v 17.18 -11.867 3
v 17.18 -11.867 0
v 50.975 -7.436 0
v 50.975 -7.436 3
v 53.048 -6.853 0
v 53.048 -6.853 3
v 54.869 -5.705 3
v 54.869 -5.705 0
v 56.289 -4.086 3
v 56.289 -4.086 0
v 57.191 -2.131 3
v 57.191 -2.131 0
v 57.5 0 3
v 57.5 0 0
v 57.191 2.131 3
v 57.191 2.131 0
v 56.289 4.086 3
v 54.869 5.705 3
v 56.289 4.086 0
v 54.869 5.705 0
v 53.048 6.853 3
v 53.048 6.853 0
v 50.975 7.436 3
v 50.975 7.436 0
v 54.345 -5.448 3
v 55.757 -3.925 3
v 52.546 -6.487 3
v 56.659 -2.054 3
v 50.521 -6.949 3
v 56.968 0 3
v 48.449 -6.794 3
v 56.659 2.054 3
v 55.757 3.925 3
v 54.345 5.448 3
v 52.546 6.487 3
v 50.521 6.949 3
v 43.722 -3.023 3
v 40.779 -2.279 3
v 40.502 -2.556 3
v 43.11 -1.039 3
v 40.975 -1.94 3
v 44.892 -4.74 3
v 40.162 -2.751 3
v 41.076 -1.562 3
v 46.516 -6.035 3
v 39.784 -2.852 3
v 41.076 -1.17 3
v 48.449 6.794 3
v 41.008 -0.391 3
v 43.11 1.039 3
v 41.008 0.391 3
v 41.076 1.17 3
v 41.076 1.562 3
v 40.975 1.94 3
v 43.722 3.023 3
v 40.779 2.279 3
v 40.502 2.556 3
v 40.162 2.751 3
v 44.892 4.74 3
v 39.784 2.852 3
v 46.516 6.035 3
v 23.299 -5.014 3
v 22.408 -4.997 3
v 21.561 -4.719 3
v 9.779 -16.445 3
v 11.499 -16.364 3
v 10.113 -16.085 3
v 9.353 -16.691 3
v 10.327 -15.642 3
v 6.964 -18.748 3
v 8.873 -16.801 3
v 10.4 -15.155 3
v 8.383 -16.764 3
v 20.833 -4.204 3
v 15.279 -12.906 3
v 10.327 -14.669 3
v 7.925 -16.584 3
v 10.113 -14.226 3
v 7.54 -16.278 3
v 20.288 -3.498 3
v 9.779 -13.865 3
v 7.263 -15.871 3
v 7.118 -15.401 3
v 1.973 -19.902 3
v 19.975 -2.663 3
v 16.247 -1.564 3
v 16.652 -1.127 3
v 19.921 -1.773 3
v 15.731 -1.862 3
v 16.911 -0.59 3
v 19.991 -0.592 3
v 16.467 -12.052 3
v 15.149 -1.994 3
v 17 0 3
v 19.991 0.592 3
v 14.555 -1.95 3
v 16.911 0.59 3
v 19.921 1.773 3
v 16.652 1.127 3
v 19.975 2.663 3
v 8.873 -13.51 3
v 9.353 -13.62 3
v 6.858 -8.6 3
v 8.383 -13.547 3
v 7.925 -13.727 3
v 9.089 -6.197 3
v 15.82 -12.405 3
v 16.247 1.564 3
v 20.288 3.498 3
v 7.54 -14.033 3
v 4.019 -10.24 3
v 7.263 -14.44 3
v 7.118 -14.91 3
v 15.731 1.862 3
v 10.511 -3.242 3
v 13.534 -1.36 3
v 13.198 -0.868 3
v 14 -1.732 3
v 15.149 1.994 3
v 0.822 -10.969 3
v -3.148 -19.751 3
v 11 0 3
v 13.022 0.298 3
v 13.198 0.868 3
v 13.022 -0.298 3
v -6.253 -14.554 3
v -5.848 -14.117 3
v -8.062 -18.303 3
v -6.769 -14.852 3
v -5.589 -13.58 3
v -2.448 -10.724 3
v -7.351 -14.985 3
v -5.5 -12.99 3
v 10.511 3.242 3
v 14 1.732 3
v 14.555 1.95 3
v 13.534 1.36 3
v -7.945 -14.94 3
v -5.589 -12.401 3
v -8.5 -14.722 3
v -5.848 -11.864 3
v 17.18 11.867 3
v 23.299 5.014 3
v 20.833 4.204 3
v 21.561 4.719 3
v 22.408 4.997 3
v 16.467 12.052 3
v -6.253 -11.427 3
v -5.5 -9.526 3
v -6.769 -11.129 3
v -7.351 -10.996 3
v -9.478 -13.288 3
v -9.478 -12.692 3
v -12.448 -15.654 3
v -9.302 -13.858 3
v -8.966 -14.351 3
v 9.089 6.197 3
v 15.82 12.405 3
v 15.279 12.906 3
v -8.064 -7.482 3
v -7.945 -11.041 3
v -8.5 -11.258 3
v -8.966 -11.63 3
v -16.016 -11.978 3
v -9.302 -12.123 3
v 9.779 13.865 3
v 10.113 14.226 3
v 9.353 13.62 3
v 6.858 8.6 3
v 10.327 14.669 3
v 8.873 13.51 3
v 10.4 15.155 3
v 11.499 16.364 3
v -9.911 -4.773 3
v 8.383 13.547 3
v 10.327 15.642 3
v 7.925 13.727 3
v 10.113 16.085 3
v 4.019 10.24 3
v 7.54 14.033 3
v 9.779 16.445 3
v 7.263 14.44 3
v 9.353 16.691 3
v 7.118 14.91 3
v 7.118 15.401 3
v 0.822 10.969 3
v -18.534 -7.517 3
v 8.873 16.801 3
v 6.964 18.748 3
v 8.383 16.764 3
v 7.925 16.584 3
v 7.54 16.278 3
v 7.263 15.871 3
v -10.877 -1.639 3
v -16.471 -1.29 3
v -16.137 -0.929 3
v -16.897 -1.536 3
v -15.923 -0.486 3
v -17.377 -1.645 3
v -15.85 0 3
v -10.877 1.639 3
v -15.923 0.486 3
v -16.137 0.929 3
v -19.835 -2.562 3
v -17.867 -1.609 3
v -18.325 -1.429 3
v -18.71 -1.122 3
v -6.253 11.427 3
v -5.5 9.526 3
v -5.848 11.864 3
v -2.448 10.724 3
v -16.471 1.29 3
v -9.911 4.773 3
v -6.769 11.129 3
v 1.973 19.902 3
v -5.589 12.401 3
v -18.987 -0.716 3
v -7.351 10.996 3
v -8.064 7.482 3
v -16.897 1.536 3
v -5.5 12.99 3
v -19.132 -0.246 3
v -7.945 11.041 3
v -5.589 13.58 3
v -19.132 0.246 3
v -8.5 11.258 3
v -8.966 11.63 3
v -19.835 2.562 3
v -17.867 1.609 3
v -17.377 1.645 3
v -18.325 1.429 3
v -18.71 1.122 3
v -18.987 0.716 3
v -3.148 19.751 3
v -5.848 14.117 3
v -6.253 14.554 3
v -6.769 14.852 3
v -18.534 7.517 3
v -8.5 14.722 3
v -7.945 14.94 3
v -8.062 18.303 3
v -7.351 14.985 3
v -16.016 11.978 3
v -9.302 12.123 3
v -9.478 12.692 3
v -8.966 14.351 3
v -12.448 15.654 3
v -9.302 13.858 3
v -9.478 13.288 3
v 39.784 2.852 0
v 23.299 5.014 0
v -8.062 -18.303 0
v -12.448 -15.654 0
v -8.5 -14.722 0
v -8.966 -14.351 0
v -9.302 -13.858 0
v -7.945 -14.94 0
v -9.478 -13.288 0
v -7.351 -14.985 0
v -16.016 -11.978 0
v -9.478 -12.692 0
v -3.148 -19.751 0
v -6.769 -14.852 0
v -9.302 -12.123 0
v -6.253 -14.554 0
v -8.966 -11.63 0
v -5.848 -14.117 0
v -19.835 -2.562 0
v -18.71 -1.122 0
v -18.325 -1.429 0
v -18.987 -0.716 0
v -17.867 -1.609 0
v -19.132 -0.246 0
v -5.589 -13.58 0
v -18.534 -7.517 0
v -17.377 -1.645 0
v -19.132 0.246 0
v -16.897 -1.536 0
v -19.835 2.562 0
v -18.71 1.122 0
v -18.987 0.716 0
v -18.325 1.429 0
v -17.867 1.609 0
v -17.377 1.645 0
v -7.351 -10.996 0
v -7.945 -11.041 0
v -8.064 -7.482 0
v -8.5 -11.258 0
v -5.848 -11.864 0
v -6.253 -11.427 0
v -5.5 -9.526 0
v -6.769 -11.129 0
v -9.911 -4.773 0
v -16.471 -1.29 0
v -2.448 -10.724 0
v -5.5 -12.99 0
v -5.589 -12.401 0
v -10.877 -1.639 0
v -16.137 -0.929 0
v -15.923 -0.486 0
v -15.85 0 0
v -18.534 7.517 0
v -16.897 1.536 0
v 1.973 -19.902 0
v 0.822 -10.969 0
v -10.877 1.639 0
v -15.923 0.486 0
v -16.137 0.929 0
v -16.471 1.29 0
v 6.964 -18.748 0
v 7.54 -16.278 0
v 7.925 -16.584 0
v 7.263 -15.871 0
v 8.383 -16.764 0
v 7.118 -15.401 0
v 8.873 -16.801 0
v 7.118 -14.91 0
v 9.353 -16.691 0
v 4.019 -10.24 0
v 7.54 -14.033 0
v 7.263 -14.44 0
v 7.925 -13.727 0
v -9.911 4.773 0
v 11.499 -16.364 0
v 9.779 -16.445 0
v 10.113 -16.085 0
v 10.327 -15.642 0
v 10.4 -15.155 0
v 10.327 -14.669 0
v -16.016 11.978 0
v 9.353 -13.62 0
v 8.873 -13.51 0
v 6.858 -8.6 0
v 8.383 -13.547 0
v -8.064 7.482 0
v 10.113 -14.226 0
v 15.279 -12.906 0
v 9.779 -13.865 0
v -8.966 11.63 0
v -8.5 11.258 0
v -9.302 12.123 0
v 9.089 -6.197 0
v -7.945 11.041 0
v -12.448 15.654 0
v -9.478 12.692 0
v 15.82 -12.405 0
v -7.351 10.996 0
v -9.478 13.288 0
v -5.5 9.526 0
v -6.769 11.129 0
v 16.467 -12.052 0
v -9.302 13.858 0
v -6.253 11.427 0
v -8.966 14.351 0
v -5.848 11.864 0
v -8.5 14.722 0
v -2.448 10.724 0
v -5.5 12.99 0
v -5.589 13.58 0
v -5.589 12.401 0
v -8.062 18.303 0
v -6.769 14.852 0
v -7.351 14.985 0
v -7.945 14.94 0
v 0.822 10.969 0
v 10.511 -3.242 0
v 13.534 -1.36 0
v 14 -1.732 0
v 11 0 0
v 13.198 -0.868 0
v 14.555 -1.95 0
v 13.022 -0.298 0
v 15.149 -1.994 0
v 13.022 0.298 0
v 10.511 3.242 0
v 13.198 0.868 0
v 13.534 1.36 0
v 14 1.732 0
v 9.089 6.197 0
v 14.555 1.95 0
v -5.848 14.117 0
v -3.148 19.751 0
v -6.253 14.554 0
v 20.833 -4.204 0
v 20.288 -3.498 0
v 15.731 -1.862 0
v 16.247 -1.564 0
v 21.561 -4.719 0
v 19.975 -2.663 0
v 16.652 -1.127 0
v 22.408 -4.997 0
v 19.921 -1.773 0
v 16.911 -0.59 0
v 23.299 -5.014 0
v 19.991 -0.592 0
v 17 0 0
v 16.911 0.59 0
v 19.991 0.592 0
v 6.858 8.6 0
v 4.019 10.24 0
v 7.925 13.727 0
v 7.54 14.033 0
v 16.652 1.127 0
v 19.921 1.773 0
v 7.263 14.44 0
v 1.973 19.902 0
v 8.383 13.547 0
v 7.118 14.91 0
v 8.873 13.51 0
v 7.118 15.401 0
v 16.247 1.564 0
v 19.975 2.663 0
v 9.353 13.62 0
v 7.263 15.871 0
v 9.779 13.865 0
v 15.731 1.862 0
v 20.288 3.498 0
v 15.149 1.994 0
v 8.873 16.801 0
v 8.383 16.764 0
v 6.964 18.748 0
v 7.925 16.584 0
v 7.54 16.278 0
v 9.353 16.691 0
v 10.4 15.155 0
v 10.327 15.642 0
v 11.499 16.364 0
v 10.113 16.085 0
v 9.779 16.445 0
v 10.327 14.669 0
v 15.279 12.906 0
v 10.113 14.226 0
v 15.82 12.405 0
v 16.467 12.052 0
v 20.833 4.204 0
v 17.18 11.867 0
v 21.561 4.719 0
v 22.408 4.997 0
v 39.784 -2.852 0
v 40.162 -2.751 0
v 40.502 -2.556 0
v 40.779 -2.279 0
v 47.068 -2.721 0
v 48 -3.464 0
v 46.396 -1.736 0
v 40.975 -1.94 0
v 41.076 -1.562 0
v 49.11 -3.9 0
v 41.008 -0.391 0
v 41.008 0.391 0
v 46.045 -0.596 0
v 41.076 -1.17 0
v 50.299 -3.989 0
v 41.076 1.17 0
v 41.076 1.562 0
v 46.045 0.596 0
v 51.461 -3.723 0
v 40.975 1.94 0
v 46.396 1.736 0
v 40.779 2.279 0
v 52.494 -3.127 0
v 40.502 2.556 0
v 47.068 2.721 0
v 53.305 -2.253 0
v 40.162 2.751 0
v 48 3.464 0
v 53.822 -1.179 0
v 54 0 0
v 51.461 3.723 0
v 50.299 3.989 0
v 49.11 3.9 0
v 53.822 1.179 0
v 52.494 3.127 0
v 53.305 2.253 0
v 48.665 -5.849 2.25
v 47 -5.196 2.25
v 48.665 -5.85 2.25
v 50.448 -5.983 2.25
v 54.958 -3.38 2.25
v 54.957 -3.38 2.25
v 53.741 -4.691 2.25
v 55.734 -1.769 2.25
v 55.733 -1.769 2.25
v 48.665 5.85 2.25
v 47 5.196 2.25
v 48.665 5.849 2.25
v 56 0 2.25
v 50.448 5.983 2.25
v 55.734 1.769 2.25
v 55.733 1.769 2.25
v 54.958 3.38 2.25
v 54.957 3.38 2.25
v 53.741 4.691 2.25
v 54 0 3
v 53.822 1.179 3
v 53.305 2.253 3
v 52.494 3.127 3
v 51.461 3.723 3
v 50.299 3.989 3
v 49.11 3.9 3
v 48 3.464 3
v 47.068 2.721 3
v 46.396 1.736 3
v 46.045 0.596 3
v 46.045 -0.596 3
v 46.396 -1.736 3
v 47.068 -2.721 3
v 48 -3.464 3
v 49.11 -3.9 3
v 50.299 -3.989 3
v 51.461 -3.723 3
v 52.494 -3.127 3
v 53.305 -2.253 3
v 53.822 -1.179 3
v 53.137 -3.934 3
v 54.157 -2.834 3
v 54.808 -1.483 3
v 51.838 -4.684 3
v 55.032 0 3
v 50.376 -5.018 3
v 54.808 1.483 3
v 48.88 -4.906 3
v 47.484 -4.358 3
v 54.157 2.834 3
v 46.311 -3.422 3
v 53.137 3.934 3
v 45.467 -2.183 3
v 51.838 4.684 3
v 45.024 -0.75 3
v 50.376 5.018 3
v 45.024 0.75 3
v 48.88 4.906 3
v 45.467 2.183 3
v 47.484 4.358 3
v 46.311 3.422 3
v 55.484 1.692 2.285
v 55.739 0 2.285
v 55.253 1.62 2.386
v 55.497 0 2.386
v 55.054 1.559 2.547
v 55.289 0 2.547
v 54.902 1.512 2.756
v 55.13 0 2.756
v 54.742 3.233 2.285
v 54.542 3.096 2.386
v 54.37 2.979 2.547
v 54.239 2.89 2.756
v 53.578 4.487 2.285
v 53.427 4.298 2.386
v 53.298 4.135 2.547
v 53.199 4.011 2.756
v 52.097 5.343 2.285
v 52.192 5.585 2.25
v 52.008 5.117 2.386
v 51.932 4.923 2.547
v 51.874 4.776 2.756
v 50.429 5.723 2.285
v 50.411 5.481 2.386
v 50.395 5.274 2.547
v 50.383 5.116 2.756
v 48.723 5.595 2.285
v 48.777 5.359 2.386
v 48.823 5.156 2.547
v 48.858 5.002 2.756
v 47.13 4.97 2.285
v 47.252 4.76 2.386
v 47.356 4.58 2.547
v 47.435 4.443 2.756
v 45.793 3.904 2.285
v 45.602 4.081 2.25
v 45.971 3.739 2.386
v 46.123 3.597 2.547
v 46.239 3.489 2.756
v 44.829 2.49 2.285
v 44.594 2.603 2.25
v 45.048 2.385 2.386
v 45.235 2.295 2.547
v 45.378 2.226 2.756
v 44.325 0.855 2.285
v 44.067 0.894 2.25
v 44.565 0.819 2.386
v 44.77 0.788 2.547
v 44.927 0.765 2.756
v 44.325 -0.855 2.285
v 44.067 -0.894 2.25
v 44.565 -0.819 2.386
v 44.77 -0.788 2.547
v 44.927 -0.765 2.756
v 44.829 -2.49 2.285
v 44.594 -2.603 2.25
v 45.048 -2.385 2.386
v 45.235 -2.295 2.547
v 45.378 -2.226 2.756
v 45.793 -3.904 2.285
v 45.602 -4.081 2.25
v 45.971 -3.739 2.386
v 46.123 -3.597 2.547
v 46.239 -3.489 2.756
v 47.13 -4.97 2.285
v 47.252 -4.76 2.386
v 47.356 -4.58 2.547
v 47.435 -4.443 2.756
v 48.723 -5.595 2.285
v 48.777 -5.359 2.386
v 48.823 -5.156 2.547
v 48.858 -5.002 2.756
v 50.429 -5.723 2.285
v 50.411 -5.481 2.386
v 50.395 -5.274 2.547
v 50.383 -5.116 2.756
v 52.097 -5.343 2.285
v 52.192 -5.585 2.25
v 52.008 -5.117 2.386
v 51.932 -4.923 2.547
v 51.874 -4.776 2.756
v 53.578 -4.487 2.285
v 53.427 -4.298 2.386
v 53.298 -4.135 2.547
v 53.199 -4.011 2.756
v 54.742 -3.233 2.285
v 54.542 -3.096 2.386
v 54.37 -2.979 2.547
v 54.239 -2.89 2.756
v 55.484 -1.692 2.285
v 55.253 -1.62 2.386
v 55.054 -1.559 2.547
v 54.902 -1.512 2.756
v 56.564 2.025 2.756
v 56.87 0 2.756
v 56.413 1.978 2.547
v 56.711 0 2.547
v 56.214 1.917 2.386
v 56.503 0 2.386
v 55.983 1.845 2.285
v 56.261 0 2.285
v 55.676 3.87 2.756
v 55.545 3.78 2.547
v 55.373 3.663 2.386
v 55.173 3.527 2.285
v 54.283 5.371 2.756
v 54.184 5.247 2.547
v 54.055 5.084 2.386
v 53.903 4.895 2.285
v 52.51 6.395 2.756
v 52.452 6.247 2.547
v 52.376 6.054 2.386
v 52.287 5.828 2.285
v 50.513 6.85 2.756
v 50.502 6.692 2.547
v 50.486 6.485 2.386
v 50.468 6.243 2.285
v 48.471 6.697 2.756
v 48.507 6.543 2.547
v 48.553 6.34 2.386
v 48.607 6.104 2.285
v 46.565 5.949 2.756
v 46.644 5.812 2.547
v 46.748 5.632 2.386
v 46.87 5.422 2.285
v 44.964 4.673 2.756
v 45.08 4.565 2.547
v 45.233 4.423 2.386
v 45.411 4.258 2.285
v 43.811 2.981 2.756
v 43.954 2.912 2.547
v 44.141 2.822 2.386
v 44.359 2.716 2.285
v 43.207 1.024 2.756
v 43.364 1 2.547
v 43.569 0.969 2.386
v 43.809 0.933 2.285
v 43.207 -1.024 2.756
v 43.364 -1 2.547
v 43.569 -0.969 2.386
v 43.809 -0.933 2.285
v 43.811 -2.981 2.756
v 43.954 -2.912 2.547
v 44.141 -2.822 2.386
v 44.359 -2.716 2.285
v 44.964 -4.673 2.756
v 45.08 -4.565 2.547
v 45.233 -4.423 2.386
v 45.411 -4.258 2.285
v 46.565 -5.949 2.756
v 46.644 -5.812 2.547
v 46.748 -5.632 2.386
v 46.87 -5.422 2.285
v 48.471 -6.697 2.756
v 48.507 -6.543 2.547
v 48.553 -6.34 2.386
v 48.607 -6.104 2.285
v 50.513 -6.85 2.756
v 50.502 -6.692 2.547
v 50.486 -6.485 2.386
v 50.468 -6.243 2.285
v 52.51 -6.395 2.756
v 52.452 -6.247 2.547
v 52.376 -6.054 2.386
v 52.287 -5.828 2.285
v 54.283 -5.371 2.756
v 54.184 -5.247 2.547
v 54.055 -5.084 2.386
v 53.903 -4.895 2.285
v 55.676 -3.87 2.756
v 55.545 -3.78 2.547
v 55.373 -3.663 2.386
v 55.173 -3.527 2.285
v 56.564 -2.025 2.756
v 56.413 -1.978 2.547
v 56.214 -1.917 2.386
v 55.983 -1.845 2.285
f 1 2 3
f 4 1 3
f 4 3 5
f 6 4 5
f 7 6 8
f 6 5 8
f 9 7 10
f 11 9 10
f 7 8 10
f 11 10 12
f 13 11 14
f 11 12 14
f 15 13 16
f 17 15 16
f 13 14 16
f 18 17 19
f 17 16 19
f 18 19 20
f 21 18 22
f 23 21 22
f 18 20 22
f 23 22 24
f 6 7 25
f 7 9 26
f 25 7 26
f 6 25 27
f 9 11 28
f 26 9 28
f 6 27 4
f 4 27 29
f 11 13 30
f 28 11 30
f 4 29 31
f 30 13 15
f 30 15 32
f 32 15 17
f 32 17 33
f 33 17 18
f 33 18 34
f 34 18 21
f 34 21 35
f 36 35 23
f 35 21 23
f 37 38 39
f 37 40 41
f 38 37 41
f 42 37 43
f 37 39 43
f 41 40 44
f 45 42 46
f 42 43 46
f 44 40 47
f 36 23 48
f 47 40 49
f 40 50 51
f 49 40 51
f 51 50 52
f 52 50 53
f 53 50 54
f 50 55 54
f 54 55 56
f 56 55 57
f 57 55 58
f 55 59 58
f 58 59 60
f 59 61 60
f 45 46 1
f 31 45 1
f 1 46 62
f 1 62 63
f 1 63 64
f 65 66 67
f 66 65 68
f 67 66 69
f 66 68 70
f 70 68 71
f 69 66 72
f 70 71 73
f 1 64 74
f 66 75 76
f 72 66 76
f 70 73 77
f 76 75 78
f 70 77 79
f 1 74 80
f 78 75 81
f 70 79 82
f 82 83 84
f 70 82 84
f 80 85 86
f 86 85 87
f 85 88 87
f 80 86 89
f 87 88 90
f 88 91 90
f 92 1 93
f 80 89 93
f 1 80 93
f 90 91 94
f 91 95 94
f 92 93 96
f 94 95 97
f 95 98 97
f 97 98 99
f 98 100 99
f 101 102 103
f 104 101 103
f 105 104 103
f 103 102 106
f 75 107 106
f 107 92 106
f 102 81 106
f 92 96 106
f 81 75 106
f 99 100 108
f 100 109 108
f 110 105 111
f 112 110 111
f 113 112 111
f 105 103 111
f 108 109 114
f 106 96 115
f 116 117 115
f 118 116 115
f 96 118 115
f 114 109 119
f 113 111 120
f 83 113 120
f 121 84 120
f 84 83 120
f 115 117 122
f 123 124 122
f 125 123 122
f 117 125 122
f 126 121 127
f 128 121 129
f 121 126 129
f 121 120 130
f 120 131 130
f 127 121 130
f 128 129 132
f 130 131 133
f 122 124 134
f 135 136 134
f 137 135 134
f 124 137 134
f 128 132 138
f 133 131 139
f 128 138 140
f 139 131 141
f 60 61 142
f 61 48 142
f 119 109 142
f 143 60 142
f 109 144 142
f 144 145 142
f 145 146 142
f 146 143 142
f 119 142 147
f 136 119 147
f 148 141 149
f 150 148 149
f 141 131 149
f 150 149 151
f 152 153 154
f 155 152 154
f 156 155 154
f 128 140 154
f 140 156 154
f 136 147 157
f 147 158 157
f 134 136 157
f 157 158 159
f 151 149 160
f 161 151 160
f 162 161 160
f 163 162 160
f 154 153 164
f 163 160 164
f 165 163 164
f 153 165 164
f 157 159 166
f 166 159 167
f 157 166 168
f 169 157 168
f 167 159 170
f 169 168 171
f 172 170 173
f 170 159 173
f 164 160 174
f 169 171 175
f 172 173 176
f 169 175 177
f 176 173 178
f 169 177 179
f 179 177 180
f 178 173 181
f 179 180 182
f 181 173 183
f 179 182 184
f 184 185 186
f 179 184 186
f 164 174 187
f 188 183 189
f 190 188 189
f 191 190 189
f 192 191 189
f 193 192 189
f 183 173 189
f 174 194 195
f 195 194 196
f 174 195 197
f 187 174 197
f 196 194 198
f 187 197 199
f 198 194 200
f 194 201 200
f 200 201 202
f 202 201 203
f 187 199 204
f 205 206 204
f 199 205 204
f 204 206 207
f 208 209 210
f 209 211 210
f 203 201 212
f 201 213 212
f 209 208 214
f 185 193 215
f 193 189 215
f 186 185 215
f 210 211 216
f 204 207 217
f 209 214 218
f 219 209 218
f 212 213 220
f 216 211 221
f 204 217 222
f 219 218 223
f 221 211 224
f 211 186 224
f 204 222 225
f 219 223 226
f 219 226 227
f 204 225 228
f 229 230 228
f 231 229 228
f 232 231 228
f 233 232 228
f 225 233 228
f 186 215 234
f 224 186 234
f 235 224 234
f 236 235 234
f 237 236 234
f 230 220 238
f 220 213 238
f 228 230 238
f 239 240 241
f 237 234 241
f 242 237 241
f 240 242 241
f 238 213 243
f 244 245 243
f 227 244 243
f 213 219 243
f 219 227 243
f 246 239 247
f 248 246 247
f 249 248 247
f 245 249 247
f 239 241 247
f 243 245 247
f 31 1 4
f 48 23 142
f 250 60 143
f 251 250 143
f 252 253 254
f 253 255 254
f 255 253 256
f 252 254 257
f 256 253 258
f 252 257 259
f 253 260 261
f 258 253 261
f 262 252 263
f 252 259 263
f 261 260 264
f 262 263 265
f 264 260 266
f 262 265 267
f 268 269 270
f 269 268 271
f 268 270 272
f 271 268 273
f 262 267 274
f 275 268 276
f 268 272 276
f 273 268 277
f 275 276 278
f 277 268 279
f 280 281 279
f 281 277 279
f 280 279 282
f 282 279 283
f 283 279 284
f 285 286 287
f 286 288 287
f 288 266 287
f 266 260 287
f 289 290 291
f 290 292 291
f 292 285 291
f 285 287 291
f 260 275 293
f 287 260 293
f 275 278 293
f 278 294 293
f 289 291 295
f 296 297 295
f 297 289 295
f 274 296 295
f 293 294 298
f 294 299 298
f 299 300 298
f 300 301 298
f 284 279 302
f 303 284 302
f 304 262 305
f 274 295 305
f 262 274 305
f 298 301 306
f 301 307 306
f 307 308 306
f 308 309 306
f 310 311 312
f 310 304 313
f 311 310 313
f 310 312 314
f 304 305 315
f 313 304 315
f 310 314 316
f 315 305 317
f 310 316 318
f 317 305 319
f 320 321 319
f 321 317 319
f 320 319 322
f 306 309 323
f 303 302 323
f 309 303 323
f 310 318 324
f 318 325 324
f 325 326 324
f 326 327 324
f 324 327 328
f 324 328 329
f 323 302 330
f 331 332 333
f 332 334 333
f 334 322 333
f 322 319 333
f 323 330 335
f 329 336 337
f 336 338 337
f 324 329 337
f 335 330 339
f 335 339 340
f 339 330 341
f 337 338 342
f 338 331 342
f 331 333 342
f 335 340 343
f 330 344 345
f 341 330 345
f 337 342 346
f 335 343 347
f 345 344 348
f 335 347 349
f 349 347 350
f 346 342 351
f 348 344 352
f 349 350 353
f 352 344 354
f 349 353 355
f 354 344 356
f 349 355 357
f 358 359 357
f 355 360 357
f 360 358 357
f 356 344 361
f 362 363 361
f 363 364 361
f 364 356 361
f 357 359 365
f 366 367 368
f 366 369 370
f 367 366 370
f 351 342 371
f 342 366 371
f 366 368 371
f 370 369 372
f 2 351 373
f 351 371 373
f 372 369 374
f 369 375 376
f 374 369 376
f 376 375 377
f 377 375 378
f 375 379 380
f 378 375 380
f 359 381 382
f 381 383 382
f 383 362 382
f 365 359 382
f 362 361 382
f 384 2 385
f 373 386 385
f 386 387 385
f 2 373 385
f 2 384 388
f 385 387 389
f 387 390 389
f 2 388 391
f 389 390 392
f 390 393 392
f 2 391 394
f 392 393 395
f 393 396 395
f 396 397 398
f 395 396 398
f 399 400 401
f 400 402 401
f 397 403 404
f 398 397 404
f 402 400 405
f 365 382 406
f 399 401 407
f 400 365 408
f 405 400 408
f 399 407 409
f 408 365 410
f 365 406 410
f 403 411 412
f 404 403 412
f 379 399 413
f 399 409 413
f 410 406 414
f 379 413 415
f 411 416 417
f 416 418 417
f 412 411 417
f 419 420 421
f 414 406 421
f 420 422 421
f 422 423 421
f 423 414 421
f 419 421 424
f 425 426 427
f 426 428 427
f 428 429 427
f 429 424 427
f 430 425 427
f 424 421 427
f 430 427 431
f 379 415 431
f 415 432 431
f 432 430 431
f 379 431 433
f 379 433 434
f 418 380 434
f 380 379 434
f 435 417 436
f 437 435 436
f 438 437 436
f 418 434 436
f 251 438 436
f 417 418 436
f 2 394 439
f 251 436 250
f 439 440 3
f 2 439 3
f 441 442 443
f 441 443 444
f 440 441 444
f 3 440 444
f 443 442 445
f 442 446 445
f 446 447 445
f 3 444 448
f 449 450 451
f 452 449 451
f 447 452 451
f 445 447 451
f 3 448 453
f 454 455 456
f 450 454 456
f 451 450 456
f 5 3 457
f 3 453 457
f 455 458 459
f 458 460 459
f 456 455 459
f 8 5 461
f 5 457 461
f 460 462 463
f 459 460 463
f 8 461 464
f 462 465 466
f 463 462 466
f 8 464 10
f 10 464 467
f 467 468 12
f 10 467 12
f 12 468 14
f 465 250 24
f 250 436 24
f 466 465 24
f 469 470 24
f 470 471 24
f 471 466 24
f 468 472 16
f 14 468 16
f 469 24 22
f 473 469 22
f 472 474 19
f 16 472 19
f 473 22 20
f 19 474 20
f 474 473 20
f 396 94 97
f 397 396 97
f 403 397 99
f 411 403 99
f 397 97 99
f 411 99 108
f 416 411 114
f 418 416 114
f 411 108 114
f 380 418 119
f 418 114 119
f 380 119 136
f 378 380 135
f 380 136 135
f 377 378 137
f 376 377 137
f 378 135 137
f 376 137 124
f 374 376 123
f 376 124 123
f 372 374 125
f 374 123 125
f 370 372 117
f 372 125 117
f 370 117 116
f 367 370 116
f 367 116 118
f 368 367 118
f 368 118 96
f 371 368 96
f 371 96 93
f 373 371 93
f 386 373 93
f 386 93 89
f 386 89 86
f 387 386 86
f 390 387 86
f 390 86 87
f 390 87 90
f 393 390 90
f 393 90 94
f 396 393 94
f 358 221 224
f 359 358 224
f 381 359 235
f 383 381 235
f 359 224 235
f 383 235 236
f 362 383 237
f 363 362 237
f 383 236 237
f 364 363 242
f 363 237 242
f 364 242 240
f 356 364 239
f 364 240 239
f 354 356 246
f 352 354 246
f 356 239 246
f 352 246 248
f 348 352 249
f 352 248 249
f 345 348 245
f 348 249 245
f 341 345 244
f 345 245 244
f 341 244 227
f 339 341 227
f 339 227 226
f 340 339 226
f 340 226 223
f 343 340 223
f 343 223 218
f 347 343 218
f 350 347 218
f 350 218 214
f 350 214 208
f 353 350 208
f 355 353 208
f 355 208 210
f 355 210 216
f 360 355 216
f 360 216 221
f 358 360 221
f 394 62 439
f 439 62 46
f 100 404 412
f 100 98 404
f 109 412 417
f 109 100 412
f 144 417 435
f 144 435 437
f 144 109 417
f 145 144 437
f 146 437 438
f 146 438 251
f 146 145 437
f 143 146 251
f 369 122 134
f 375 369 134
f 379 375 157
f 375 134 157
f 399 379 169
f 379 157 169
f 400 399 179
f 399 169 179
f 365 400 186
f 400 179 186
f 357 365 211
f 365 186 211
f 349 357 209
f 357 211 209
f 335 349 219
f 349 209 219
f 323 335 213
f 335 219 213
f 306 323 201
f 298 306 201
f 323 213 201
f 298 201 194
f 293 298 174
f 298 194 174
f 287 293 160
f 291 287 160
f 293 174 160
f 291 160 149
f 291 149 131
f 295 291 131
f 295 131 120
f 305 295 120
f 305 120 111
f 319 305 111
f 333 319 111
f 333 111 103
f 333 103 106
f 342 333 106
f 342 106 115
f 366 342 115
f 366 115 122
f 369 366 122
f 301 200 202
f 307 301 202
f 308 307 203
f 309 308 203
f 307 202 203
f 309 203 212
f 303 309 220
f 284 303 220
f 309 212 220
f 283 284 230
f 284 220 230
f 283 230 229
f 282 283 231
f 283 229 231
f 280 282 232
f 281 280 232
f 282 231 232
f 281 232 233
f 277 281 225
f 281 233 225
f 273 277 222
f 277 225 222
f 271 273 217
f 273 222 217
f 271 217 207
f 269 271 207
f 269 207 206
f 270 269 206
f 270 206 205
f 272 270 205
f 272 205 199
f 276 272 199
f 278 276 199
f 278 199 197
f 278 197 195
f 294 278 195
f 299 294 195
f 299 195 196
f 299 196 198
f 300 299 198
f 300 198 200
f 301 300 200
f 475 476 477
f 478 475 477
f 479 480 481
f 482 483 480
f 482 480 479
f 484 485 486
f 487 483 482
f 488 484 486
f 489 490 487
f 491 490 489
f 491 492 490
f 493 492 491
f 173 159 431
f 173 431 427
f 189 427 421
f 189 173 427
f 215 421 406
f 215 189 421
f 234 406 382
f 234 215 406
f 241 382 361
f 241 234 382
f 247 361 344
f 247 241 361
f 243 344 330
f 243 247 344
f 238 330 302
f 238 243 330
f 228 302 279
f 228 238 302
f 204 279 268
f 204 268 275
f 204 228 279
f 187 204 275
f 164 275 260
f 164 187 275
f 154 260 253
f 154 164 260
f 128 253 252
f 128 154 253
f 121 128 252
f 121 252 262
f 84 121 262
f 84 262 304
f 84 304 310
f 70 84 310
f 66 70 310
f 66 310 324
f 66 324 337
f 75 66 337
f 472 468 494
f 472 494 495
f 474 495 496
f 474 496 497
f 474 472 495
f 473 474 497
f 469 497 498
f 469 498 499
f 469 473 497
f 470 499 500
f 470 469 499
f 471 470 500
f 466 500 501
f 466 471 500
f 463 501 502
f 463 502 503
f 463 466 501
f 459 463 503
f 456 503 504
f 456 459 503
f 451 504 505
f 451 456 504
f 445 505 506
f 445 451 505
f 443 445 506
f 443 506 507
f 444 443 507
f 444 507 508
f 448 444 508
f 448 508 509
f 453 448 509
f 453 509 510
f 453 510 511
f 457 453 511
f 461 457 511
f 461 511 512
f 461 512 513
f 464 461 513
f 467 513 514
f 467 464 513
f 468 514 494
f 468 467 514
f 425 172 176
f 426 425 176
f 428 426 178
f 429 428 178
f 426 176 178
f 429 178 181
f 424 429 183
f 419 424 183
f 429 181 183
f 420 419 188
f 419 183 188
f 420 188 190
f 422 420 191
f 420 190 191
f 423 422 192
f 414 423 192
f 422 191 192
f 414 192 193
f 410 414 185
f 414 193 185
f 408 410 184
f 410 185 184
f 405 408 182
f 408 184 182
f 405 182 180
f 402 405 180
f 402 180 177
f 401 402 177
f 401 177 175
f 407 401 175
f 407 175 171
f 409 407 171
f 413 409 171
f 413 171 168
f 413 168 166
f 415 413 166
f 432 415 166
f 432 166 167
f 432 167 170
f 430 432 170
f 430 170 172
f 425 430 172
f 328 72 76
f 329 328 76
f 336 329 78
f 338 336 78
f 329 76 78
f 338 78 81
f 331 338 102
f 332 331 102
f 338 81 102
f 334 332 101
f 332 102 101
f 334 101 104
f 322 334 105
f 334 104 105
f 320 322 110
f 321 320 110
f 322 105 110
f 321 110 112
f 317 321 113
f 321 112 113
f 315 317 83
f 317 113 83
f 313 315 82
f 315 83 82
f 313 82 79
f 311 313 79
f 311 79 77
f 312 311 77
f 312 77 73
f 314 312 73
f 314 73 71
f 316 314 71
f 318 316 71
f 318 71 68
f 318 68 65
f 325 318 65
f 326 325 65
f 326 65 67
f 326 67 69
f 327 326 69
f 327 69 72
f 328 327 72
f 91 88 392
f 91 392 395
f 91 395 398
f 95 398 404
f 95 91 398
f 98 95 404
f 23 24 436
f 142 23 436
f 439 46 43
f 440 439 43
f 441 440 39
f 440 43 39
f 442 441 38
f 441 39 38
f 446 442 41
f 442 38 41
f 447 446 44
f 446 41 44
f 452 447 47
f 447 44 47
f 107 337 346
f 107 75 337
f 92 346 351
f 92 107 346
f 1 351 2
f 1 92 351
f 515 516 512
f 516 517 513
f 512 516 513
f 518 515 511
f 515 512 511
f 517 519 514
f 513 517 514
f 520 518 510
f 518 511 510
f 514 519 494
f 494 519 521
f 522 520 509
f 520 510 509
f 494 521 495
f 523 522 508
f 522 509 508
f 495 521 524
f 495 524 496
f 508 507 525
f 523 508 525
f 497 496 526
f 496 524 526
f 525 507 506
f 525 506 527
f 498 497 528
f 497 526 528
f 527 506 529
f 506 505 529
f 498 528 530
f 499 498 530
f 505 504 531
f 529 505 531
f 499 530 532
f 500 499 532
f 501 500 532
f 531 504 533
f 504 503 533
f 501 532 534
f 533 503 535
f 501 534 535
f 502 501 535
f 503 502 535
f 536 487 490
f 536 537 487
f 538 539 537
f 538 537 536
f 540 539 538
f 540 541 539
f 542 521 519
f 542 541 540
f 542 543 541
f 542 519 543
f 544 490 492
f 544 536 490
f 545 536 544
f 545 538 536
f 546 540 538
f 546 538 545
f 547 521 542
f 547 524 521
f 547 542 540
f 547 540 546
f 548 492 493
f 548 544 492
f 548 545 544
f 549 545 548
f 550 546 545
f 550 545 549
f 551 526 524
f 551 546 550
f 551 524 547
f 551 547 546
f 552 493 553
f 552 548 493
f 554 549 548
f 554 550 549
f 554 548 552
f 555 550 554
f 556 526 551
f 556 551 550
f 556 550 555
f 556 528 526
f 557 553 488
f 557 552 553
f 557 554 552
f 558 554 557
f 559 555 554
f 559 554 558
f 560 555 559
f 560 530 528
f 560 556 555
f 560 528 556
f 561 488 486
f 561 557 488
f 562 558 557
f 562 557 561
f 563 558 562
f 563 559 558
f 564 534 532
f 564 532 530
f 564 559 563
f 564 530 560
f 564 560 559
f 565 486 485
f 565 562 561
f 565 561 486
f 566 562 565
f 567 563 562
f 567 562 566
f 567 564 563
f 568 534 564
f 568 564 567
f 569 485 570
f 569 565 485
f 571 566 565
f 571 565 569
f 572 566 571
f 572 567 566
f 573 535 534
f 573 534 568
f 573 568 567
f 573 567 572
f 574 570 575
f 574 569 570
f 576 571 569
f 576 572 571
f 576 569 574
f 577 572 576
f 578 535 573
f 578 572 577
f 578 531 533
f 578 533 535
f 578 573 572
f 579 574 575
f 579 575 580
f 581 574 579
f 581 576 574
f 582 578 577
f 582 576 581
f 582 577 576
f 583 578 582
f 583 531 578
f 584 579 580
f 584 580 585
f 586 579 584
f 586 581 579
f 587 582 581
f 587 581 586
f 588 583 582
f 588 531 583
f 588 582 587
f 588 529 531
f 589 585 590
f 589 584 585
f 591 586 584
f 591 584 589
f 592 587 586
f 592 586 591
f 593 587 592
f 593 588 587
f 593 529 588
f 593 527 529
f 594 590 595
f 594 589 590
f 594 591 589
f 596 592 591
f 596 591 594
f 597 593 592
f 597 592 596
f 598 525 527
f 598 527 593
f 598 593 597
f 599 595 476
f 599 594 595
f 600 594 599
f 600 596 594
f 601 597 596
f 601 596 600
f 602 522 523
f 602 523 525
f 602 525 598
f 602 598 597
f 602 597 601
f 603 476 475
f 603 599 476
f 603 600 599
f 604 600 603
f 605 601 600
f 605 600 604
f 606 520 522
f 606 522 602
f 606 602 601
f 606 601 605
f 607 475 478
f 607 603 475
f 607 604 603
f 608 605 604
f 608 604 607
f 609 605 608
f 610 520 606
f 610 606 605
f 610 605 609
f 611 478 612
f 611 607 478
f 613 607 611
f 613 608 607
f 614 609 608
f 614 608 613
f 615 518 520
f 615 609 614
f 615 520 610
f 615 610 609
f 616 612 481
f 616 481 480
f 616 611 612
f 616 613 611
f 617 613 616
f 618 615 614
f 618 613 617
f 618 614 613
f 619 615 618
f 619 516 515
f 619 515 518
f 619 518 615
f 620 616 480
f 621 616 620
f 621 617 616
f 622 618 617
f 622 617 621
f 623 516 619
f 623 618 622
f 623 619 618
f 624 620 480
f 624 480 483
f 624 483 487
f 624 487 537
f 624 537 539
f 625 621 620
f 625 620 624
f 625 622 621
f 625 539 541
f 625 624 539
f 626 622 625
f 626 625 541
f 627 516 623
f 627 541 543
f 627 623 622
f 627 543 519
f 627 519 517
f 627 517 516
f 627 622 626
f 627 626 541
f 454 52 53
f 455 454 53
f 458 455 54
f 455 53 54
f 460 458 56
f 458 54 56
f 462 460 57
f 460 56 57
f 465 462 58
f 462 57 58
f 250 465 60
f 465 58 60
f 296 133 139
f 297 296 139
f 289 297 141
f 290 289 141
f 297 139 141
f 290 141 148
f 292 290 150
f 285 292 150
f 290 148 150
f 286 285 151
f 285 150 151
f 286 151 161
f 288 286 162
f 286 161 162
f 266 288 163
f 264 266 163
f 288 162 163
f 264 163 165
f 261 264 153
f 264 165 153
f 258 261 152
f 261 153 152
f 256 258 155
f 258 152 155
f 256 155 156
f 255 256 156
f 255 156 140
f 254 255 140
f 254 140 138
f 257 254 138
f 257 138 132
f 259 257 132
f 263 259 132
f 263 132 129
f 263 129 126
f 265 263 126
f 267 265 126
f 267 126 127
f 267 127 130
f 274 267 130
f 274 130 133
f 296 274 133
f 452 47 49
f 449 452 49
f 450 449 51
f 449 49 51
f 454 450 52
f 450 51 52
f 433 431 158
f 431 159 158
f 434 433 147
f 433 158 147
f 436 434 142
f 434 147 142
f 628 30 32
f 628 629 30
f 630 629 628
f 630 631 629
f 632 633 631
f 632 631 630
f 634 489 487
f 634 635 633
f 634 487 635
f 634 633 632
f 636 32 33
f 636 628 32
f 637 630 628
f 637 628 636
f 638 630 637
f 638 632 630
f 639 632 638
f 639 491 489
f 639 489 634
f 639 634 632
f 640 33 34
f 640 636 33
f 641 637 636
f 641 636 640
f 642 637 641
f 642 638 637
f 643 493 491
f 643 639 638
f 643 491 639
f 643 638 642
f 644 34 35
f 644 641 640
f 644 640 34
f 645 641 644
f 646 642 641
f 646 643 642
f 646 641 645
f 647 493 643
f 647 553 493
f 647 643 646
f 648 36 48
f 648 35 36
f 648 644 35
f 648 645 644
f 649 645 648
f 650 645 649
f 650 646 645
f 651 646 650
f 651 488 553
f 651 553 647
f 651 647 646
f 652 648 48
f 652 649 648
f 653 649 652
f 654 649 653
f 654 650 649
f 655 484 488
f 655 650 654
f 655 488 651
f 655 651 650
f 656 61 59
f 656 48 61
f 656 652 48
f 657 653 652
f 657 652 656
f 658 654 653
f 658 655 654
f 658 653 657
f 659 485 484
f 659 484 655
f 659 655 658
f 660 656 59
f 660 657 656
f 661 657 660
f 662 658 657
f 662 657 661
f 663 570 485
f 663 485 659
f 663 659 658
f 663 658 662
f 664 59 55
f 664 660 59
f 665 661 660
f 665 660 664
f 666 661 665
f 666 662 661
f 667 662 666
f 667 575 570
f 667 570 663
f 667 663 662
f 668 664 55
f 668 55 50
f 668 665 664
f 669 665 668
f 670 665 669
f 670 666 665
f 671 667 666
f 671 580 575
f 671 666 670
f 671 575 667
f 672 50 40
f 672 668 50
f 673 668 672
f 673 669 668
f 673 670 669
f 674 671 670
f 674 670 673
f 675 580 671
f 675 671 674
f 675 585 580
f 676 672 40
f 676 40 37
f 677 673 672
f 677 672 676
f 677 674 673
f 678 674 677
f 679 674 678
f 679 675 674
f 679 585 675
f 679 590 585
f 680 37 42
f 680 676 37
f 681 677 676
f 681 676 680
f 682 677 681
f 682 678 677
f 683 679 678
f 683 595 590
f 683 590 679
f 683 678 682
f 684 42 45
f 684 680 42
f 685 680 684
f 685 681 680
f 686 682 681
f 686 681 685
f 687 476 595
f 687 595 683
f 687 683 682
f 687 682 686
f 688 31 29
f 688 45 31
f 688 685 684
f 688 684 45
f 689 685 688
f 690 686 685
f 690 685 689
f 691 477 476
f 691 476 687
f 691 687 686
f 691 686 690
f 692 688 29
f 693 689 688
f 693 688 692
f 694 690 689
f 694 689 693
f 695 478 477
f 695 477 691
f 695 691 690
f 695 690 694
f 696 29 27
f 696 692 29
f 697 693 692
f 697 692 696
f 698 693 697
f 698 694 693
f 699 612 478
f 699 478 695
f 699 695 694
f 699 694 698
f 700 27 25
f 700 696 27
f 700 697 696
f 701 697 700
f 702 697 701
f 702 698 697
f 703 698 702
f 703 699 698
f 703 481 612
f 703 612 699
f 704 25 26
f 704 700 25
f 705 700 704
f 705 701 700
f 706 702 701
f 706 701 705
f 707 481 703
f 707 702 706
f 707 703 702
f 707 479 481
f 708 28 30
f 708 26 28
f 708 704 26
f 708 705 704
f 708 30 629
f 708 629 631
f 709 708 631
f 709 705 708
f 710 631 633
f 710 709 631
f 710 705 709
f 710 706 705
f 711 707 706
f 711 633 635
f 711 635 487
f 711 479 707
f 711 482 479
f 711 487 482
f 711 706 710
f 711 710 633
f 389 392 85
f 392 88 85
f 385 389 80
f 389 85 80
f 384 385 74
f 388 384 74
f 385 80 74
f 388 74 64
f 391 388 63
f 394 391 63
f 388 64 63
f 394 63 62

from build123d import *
from build123d.topology import SkipClean

# Parameters (mm, degrees)
SKETCH_1_R          = 1.65
SKETCH_1_R_2        = 5
SKETCH_1_R_3        = 4
EXTRUDE_1_DEPTH     = 3
CUT_EXTRUDE_1_DEPTH = 5
CUT_EXTRUDE_START   = -2
SKETCH_3_R          = 2.55
CUT_EXTRUDE_2_DEPTH = 1
SKETCH_4_R          = 20
EXTRUDE_2_DEPTH     = 3
SKETCH_5_R          = 11
SKETCH_5_R_2        = 1.65
SKETCH_5_R_3        = 2
CUT_EXTRUDE_3_DEPTH = 61.952850631
FILLET_1_R          = 3
SKETCH_8_R          = 7.5
EXTRUDE_4_DEPTH     = 0.25
SKETCH_9_R          = 7
SKETCH_9_R_2        = 5
CUT_EXTRUDE_4_DEPTH = 1
FILLET_2_R          = 1
SKETCH_11_R         = 7.5
CUT_EXTRUDE_6_DEPTH = 0.25


with BuildPart() as part:
    # 草图1 → 凸台-拉伸1 (new body)
    with BuildSketch(Plane.XY):
        with BuildLine():
            Line((1.82, -13.881195914), (50.975, -7.436354954))
            ThreePointArc((50.975, -7.436354954), (57.5, 0), (50.975, 7.436354954))
            Line((50.975, 7.436354954), (1.82, 13.881195914))
            ThreePointArc((1.82, 13.881195914), (-14, 0), (1.82, -13.881195914))
        make_face()
        with Locations((-9, 0)):
            Circle(SKETCH_1_R, mode=Mode.SUBTRACT)
        with Locations((4.5, 7.794228634)):
            Circle(SKETCH_1_R, mode=Mode.SUBTRACT)
        with Locations((4.5, -7.794228634)):
            Circle(SKETCH_1_R, mode=Mode.SUBTRACT)
        Circle(SKETCH_1_R_2, mode=Mode.SUBTRACT)
        with Locations((50, 0)):
            Circle(SKETCH_1_R_3, mode=Mode.SUBTRACT)
    extrude(amount=EXTRUDE_1_DEPTH)

    # 草图2 → 切除-拉伸1 (cut)
    with BuildSketch(Plane.XY.offset(3)):
        with BuildLine():
            Line((16.077054233, -5.960564335), (39.784103065, -2.852270991))
            ThreePointArc((39.784103065, -2.852270991), (40.77864829, -2.278773581), (41.076374055, -1.17))
            ThreePointArc((41.076374055, -1.17), (41, 0), (41.076374055, 1.17))
            ThreePointArc((41.076374055, 1.17), (40.77864829, 2.278773581), (39.784103065, 2.852270991))
            Line((39.784103065, 2.852270991), (16.077054233, 5.960564335))
            ThreePointArc((16.077054233, 5.960564335), (14.747754312, 5.454804266), (14.438231121, 4.066630313))
            ThreePointArc((14.438231121, 4.066630313), (15, 0), (14.438231121, -4.066630313))
            ThreePointArc((14.438231121, -4.066630313), (14.747754312, -5.454804266), (16.077054233, -5.960564335))
        make_face()
    extrude(amount=-CUT_EXTRUDE_1_DEPTH, mode=Mode.SUBTRACT)

    # 草图3 → 切除-拉伸2 (cut)
    with BuildSketch(Plane.XY.offset(3).offset(CUT_EXTRUDE_START)):
        with Locations((-9, 0)):
            Circle(SKETCH_3_R)
        with Locations((4.5, 7.794228634)):
            Circle(SKETCH_3_R)
        with Locations((4.5, -7.794228634)):
            Circle(SKETCH_3_R)
    extrude(amount=-CUT_EXTRUDE_2_DEPTH, mode=Mode.SUBTRACT)

    # 草图4 → 凸台-拉伸2 (add, through all)
    with BuildSketch(Plane.XY.offset(3)):
        Circle(SKETCH_4_R)
    extrude(amount=-EXTRUDE_2_DEPTH)

    # 草图5 → 切除-拉伸3 (cut, through all)
    with BuildSketch(Plane.XY.offset(3)):
        Circle(SKETCH_5_R)
        with Locations((-17.5, 0)):
            Circle(SKETCH_5_R_2)
        with Locations((8.75, 15.155444566)):
            Circle(SKETCH_5_R_2)
        with Locations((8.75, -15.155444566)):
            Circle(SKETCH_5_R_2)
        with Locations((-7.5, 12.990381057)):
            Circle(SKETCH_5_R_3)
        with Locations((15, 0)):
            Circle(SKETCH_5_R_3)
        with Locations((-7.5, -12.990381057)):
            Circle(SKETCH_5_R_3)
    extrude(amount=-CUT_EXTRUDE_3_DEPTH, mode=Mode.SUBTRACT)

    # 圆角1
    fillet_1_edges = [part.edges().sort_by_distance(p)[0] for p in [
        (15.981652446, -12.024424522, 1.5),
        (19.214751718, -5.549172589, 1.5),
        (15.981652446, 12.024424522, 1.5),
        (19.214751718, 5.549172589, 1.5),
    ]]
    fillet(fillet_1_edges, radius=FILLET_1_R)

    # 草图8 → 凸台-拉伸4 (add)
    with SkipClean():  # the faces are left unmerged after this step: merging them gives an invalid solid
        with BuildSketch(Plane(origin=(0, 0, 3), x_dir=(-1, 0, 0), z_dir=(0, 0, -1))):
            with Locations((-50, 0)):
                Circle(SKETCH_8_R)
        extrude(amount=-EXTRUDE_4_DEPTH)

    # 草图9 → 切除-拉伸4 (cut)
    with SkipClean():  # the faces are left unmerged after this step: merging them gives an invalid solid
        with BuildSketch(Plane.XY.offset(3.25)):
            with Locations((50, 0)):
                Circle(SKETCH_9_R)
            with Locations((50, 0)):
                Circle(SKETCH_9_R_2, mode=Mode.SUBTRACT)
        extrude(amount=-CUT_EXTRUDE_4_DEPTH, mode=Mode.SUBTRACT)

    # 圆角2
    fillet_2_edges = [part.edges().sort_by_distance(p)[0] for p in [
        (43, 0, 2.25),
        (45, 0, 2.25),
    ]]
    fillet(fillet_2_edges, radius=FILLET_2_R - 0.0001)  # a hair under: the kernel refuses the full size

    # 草图11 → 切除-拉伸6 (cut)
    with BuildSketch(Plane(origin=(0, 0, 3), x_dir=(-1, 0, 0), z_dir=(0, 0, -1))):
        with Locations((-50, 0)):
            Circle(SKETCH_11_R)
    extrude(amount=-CUT_EXTRUDE_6_DEPTH, mode=Mode.SUBTRACT)


solid = part.part
